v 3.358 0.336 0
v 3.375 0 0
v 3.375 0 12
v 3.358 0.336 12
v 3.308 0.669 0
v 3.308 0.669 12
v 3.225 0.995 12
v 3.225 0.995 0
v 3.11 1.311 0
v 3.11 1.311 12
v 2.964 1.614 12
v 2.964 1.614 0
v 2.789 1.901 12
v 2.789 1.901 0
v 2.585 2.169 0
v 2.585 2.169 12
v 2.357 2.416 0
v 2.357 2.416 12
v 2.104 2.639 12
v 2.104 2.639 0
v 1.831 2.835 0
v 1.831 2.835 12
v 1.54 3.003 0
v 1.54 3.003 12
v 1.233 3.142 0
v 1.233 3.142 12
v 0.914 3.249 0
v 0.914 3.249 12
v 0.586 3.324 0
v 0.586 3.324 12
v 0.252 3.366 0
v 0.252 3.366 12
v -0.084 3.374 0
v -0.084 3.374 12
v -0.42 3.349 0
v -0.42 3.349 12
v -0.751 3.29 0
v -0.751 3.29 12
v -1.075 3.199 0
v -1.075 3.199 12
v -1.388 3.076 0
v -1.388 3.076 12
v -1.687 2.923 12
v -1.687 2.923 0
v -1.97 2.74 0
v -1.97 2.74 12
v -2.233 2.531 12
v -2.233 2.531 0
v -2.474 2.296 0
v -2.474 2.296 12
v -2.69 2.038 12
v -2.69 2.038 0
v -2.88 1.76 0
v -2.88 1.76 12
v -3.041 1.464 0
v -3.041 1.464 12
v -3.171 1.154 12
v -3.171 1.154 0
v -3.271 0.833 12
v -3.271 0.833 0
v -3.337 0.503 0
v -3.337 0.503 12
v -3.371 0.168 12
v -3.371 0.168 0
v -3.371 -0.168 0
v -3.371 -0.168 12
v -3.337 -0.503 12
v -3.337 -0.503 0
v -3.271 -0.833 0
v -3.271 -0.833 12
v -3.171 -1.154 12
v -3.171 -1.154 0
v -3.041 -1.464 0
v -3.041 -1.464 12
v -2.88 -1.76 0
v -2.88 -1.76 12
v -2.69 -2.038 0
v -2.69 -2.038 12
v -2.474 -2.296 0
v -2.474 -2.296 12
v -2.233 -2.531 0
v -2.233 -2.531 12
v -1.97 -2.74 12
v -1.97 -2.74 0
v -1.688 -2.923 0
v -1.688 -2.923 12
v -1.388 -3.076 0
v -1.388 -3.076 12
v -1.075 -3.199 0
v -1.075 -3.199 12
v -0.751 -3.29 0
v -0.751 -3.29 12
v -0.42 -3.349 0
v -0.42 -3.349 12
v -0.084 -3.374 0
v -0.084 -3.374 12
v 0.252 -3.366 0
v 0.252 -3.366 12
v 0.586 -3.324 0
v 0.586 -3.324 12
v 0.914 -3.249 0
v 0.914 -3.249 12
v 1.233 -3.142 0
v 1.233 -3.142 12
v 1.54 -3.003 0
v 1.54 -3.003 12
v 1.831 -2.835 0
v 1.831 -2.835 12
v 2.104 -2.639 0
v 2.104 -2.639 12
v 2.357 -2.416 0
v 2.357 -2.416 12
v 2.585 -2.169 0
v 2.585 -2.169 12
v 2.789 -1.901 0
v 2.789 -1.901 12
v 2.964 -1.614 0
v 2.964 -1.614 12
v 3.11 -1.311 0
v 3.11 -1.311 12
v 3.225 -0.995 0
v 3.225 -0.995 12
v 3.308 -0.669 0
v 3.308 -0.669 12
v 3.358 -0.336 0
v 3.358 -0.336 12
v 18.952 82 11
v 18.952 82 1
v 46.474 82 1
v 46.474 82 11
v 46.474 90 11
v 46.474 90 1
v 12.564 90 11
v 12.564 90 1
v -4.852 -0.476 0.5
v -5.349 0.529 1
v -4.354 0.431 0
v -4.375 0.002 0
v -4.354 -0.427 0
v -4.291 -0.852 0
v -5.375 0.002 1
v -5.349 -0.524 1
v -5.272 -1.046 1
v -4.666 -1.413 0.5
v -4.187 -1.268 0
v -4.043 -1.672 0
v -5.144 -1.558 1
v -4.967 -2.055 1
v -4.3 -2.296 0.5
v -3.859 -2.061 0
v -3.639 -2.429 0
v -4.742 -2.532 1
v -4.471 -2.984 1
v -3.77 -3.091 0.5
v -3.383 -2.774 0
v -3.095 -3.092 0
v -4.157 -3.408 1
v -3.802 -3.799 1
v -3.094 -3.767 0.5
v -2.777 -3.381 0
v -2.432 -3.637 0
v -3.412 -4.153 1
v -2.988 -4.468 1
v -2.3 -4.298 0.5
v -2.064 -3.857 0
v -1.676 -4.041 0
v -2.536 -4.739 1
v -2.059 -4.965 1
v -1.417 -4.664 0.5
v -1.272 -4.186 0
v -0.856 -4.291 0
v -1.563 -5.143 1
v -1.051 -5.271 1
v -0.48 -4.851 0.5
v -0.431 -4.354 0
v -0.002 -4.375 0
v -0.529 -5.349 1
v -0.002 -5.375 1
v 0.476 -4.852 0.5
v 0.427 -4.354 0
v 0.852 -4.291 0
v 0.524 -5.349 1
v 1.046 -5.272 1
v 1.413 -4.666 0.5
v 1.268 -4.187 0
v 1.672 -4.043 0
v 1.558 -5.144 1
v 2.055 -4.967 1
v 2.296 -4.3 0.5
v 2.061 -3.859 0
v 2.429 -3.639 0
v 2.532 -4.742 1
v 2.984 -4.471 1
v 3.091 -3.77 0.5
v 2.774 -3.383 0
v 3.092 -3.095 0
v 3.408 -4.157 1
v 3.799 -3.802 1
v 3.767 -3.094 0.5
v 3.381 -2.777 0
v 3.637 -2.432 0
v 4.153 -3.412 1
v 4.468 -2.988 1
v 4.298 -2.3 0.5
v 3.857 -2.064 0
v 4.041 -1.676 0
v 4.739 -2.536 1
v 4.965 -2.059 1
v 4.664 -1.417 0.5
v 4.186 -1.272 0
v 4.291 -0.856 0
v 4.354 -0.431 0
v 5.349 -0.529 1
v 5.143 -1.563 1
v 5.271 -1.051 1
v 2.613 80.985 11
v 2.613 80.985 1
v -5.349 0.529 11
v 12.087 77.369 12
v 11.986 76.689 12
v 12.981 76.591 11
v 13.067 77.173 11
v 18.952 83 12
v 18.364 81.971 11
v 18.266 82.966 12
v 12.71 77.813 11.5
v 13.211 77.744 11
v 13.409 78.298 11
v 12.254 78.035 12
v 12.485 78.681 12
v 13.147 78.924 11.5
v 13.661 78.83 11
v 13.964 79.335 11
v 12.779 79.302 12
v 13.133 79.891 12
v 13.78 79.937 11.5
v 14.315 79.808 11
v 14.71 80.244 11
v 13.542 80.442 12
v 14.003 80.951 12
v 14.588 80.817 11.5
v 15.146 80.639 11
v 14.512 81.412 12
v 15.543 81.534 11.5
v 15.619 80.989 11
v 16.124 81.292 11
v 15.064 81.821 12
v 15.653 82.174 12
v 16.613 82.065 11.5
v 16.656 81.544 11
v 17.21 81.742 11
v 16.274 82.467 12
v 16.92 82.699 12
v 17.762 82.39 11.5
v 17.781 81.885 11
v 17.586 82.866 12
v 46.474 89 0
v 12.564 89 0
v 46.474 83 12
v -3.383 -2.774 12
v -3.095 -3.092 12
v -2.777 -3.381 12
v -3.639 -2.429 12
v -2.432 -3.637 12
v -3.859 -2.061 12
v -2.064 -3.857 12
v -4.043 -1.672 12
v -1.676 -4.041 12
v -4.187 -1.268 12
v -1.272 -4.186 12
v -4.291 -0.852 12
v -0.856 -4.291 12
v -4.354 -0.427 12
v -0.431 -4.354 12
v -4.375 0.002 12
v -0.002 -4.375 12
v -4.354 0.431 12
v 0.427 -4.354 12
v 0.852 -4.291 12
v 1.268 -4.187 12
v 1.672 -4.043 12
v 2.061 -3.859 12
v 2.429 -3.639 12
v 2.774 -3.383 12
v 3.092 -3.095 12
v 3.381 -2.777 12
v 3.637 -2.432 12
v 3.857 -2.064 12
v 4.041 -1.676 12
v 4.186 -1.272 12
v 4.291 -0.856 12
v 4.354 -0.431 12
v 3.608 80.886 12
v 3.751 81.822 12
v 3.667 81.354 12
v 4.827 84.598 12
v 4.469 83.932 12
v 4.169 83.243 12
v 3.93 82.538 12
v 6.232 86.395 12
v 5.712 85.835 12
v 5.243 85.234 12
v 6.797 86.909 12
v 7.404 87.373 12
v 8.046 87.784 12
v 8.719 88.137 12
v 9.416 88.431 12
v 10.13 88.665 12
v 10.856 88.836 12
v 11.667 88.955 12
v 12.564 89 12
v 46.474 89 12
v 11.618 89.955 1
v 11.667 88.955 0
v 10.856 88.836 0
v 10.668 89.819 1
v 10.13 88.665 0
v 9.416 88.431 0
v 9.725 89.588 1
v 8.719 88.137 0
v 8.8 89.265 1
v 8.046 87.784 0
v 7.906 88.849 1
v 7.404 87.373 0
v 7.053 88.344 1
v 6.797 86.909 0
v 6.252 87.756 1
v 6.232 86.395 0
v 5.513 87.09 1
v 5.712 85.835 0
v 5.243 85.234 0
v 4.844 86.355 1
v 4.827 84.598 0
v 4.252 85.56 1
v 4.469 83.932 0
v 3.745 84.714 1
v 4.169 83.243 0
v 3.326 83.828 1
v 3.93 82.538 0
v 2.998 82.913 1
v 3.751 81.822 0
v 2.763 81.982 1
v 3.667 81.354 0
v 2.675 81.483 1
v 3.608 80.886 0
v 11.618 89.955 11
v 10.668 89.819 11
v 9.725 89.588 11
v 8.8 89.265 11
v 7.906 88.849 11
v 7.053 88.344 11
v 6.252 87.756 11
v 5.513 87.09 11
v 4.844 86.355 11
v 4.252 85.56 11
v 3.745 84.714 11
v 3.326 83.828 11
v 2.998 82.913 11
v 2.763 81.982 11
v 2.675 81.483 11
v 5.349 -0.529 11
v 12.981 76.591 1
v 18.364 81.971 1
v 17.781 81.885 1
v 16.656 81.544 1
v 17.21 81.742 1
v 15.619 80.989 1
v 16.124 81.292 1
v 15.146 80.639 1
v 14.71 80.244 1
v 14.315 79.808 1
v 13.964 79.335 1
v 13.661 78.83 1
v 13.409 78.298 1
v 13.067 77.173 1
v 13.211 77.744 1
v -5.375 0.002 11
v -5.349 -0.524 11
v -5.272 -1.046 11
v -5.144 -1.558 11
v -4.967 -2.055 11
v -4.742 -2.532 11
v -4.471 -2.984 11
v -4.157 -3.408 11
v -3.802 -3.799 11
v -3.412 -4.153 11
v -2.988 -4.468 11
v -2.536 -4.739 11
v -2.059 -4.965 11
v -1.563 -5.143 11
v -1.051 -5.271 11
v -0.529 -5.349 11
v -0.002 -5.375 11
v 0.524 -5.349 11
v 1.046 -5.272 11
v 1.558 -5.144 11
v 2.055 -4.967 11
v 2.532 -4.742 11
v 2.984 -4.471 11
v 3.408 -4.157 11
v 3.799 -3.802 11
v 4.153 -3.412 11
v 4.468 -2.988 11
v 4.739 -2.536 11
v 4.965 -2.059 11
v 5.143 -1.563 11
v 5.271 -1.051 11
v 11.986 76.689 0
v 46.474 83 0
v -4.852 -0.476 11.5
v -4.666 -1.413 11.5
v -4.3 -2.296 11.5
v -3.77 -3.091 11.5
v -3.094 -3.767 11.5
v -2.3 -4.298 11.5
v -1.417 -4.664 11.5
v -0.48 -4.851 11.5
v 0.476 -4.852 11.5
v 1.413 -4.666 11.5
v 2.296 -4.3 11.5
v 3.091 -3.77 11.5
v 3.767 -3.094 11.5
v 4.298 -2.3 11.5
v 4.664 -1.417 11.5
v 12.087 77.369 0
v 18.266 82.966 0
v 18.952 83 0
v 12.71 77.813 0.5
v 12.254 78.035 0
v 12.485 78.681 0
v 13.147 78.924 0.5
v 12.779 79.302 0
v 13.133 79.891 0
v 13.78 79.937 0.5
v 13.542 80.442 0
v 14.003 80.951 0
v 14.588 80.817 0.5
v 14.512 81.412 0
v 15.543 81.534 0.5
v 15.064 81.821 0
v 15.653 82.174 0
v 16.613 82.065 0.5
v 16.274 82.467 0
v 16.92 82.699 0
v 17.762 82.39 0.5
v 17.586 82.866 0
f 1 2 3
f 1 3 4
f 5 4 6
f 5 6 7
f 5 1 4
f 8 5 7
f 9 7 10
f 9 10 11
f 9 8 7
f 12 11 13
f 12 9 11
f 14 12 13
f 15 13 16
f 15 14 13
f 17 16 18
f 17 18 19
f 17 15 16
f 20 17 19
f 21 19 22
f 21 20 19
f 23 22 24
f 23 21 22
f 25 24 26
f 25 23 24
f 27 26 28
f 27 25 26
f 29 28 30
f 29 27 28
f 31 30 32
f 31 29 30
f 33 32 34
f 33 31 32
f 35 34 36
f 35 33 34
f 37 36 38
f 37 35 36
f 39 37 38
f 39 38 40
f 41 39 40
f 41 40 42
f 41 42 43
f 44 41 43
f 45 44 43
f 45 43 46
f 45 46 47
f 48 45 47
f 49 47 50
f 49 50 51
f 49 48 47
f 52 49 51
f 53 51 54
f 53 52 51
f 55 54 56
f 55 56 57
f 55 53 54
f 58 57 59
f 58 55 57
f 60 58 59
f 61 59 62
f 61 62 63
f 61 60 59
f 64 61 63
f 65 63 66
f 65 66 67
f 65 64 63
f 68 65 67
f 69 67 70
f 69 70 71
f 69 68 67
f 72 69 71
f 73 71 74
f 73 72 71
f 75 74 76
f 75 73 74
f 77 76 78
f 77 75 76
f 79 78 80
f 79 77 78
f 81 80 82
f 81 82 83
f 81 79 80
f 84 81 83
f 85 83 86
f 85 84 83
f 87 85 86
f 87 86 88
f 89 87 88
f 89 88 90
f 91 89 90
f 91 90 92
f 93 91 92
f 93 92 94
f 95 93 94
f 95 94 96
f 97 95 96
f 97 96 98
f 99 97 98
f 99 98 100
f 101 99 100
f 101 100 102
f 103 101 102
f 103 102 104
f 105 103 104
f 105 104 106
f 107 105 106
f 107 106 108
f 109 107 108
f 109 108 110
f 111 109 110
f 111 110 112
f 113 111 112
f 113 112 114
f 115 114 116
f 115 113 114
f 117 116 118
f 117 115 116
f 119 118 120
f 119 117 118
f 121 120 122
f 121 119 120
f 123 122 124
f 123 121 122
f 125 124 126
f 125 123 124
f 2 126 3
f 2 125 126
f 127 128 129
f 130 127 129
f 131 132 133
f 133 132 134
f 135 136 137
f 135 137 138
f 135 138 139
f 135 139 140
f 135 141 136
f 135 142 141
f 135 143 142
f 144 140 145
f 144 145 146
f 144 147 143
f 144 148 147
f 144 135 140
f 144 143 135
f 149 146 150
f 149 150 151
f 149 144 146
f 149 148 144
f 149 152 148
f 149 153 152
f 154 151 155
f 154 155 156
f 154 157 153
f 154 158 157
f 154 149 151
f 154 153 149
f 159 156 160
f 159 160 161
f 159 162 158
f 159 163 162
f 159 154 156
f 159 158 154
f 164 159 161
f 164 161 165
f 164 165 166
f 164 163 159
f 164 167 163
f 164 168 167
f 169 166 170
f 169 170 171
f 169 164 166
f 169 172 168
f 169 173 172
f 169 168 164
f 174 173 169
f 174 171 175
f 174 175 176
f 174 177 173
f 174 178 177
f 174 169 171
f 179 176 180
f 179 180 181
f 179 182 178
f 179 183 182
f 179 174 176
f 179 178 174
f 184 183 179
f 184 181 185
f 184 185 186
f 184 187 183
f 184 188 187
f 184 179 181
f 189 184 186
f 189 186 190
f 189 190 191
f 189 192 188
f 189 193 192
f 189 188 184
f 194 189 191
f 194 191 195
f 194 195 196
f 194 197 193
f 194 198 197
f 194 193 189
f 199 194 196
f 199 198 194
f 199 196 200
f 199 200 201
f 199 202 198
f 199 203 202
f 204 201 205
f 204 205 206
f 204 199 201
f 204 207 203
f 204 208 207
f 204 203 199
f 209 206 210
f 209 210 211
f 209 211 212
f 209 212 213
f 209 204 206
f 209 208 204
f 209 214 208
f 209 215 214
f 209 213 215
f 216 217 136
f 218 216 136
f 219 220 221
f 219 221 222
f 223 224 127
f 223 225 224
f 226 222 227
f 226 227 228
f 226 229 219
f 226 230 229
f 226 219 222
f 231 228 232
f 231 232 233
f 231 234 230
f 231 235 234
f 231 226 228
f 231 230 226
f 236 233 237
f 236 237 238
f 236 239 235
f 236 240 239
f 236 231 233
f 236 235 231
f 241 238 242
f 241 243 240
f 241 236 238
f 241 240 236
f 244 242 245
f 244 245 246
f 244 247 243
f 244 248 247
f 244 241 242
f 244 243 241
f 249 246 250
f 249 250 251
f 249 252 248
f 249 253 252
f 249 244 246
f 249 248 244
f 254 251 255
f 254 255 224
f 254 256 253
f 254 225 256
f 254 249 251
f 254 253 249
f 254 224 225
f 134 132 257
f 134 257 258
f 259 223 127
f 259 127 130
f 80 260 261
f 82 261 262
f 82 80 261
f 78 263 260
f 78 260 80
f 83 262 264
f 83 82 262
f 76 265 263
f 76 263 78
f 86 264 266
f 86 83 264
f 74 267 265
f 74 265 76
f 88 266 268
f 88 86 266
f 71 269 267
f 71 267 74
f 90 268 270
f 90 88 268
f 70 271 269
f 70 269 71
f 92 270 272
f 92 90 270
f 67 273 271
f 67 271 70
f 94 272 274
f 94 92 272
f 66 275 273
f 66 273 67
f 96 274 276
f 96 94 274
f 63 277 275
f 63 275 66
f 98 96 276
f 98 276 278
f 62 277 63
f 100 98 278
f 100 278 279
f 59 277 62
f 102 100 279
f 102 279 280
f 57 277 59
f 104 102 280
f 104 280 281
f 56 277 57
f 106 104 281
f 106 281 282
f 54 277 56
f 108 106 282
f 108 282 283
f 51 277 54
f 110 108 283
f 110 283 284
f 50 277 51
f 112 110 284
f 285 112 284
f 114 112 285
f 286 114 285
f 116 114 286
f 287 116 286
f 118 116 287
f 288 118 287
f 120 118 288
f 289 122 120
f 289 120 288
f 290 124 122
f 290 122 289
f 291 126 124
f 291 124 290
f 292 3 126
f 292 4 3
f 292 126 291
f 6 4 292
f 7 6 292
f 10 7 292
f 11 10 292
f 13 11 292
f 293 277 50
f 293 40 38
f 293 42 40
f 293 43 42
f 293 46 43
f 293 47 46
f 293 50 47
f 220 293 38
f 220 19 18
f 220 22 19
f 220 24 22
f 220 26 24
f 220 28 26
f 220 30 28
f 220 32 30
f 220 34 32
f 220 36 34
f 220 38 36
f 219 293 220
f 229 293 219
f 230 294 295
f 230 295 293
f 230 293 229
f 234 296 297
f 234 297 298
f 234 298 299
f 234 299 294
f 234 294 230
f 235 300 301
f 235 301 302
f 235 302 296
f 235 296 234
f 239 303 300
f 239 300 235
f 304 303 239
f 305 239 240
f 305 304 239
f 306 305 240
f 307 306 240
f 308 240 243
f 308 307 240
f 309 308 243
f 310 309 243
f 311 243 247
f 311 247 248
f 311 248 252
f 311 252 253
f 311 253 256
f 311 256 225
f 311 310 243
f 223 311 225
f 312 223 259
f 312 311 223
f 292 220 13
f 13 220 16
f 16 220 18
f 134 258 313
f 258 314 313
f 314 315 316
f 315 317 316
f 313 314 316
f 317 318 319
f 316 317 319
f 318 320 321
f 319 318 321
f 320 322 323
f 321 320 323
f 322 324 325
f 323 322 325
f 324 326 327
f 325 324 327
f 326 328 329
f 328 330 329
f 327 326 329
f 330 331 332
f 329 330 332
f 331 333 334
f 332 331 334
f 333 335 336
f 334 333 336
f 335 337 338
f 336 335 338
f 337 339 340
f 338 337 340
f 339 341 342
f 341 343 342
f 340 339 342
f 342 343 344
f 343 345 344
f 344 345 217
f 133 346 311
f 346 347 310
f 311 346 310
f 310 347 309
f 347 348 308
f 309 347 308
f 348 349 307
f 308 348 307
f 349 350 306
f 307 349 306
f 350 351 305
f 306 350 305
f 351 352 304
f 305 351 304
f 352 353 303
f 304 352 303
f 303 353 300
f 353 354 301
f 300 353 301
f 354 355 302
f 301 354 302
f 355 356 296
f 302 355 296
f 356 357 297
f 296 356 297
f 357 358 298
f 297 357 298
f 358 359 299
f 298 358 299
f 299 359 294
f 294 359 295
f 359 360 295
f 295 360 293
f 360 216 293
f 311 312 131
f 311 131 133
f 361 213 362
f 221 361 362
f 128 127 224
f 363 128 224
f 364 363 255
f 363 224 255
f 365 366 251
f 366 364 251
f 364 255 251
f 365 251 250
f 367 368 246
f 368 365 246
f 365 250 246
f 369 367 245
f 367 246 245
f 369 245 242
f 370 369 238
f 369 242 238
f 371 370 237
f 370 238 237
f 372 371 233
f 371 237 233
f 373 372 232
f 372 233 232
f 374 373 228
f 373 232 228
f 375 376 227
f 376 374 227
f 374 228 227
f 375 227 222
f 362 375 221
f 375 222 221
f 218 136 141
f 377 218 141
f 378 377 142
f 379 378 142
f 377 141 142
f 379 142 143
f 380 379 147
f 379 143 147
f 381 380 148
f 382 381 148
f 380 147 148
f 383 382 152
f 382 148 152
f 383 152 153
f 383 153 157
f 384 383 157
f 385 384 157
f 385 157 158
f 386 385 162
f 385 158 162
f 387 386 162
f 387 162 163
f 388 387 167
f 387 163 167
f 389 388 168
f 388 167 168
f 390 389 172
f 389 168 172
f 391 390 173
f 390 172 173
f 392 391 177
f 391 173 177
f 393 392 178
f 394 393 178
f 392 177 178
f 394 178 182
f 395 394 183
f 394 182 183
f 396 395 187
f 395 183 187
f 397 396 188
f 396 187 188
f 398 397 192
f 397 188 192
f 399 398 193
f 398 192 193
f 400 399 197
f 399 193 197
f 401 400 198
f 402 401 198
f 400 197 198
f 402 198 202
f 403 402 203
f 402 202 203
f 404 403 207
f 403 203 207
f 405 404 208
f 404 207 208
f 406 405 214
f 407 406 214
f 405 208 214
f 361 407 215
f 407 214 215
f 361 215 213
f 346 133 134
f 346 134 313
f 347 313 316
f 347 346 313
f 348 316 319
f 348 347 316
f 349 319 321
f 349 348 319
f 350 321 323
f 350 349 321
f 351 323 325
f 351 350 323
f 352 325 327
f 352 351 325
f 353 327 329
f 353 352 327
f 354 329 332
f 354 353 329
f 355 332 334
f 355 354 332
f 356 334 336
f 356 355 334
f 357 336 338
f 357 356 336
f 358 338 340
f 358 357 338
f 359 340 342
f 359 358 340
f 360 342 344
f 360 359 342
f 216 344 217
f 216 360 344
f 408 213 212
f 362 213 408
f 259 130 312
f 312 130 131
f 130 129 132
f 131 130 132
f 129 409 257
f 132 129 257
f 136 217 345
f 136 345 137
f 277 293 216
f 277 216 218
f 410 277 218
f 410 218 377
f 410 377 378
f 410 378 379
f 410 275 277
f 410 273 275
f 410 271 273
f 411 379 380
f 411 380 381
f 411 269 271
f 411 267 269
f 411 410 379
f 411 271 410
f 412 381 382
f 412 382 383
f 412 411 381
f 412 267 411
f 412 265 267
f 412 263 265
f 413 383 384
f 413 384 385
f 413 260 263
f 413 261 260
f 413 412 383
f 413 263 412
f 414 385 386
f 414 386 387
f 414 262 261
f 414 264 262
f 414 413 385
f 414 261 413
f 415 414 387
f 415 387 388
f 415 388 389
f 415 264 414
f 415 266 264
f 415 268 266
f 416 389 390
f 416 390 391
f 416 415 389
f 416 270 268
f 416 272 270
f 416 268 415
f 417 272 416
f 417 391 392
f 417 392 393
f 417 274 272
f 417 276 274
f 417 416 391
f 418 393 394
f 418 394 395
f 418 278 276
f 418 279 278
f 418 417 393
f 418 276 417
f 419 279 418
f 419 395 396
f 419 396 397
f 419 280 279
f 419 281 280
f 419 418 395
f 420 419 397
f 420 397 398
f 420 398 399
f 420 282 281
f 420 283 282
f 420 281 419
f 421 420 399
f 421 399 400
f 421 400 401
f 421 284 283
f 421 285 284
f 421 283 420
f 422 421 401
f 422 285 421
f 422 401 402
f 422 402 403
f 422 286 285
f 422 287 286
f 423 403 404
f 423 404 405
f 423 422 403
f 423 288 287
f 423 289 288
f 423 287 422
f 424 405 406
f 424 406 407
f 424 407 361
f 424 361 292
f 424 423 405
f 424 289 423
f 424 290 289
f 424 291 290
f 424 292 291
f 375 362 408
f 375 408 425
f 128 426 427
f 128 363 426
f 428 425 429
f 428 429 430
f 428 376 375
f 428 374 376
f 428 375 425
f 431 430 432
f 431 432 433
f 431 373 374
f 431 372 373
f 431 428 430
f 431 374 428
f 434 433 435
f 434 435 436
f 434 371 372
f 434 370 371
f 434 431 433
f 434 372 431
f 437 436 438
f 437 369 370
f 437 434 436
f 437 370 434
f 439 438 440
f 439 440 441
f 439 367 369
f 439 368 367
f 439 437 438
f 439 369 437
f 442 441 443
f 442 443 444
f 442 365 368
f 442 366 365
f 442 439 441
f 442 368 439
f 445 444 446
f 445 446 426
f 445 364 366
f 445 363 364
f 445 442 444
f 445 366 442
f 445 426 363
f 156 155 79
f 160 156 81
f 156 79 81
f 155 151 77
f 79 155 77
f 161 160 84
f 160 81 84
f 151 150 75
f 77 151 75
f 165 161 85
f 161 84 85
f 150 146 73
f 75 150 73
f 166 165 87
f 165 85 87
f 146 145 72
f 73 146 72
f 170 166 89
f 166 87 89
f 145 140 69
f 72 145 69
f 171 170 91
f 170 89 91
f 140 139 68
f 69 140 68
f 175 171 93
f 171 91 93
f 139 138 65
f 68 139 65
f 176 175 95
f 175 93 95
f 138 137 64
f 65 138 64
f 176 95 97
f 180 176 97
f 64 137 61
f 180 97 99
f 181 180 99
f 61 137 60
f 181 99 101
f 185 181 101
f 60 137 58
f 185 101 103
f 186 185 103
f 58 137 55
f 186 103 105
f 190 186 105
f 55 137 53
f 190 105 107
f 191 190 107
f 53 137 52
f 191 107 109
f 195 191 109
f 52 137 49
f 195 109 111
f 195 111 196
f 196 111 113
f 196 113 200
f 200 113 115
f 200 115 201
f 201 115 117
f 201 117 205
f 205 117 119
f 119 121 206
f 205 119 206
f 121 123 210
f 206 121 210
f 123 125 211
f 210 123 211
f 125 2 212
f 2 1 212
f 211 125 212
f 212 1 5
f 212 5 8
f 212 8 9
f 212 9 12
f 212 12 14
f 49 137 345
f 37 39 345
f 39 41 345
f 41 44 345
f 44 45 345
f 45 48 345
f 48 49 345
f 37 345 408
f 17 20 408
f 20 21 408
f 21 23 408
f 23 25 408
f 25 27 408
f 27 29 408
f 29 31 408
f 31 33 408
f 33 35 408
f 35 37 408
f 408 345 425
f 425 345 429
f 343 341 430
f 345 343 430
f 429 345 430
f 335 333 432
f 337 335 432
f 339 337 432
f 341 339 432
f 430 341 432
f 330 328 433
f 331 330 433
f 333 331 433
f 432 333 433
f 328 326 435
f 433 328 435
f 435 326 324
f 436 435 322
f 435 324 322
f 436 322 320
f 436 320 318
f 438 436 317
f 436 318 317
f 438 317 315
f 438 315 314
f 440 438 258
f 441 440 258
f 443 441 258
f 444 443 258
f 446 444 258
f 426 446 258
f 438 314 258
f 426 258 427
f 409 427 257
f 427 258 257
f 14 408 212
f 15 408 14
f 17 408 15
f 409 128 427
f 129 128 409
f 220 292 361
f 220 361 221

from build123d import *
from OCP.BRepFilletAPI import BRepFilletAPI_MakeFillet

# Parameters (mm, degrees)
SKETCH1_R           = 3.375
BOSS_EXTRUDE1_DEPTH = 12
FILLET1_R1          = 10
FILLET1_R2          = 6
CHAMFER1_SIZE       = 1


with BuildPart() as part:
    # Sketch1 → Boss-Extrude1 (new body)
    with BuildSketch(Plane.XY):
        with BuildLine():
            Line((3.505234224, 90), (-5.348872315, 0.529329726))
            ThreePointArc((-5.348872315, 0.529329726), (-0.529329726, -5.348872315), (5.348872315, -0.529329726))
            Line((5.348872315, -0.529329726), (13.516056888, 82))
            Line((13.516056888, 82), (46.473934517, 82))
            Line((46.473934517, 82), (46.473934517, 90))
            Line((46.473934517, 90), (3.505234224, 90))
        make_face()
        Circle(SKETCH1_R, mode=Mode.SUBTRACT)
    extrude(amount=BOSS_EXTRUDE1_DEPTH)

    # Fillet1: one fillet with a radius per group of edges: ONE call of the kernel's fillet builder (fillet() takes one radius for all edges)
    fillet1_edges_1 = [part.edges().sort_by_distance(p)[0] for p in [
        (3.505234224, 90, 6),
    ]]
    fillet1_edges_2 = [part.edges().sort_by_distance(p)[0] for p in [
        (13.516056888, 82, 6),
    ]]
    fillet1 = BRepFilletAPI_MakeFillet(part.part.solid().wrapped)
    for e in fillet1_edges_1:
        fillet1.Add(FILLET1_R1, e.wrapped)
    for e in fillet1_edges_2:
        fillet1.Add(FILLET1_R2, e.wrapped)
    add(Compound.cast(fillet1.Shape()), mode=Mode.REPLACE)

    # Chamfer1
    chamfer1_edges = [part.edges().sort_by_distance(p)[0] for p in [
        (32.712766845, 82, 0),
        (14.92327931, 80.446643575, 0),
        (9.164818638, 38.030774984, 0),
        (-0.529329726, -5.348872315, 0),
        (-1.367895651, 40.757064607, 0),
        (5.850604928, 87.411072625, 0),
        (29.519202941, 90, 0),
        (32.712766845, 82, 12),
        (14.92327931, 80.446643575, 12),
        (9.164818638, 38.030774984, 12),
        (-0.529329726, -5.348872315, 12),
        (-1.367895651, 40.757064607, 12),
        (5.850604928, 87.411072625, 12),
        (29.519202941, 90, 12),
    ]]
    chamfer(chamfer1_edges, length=CHAMFER1_SIZE)


solid = part.part
